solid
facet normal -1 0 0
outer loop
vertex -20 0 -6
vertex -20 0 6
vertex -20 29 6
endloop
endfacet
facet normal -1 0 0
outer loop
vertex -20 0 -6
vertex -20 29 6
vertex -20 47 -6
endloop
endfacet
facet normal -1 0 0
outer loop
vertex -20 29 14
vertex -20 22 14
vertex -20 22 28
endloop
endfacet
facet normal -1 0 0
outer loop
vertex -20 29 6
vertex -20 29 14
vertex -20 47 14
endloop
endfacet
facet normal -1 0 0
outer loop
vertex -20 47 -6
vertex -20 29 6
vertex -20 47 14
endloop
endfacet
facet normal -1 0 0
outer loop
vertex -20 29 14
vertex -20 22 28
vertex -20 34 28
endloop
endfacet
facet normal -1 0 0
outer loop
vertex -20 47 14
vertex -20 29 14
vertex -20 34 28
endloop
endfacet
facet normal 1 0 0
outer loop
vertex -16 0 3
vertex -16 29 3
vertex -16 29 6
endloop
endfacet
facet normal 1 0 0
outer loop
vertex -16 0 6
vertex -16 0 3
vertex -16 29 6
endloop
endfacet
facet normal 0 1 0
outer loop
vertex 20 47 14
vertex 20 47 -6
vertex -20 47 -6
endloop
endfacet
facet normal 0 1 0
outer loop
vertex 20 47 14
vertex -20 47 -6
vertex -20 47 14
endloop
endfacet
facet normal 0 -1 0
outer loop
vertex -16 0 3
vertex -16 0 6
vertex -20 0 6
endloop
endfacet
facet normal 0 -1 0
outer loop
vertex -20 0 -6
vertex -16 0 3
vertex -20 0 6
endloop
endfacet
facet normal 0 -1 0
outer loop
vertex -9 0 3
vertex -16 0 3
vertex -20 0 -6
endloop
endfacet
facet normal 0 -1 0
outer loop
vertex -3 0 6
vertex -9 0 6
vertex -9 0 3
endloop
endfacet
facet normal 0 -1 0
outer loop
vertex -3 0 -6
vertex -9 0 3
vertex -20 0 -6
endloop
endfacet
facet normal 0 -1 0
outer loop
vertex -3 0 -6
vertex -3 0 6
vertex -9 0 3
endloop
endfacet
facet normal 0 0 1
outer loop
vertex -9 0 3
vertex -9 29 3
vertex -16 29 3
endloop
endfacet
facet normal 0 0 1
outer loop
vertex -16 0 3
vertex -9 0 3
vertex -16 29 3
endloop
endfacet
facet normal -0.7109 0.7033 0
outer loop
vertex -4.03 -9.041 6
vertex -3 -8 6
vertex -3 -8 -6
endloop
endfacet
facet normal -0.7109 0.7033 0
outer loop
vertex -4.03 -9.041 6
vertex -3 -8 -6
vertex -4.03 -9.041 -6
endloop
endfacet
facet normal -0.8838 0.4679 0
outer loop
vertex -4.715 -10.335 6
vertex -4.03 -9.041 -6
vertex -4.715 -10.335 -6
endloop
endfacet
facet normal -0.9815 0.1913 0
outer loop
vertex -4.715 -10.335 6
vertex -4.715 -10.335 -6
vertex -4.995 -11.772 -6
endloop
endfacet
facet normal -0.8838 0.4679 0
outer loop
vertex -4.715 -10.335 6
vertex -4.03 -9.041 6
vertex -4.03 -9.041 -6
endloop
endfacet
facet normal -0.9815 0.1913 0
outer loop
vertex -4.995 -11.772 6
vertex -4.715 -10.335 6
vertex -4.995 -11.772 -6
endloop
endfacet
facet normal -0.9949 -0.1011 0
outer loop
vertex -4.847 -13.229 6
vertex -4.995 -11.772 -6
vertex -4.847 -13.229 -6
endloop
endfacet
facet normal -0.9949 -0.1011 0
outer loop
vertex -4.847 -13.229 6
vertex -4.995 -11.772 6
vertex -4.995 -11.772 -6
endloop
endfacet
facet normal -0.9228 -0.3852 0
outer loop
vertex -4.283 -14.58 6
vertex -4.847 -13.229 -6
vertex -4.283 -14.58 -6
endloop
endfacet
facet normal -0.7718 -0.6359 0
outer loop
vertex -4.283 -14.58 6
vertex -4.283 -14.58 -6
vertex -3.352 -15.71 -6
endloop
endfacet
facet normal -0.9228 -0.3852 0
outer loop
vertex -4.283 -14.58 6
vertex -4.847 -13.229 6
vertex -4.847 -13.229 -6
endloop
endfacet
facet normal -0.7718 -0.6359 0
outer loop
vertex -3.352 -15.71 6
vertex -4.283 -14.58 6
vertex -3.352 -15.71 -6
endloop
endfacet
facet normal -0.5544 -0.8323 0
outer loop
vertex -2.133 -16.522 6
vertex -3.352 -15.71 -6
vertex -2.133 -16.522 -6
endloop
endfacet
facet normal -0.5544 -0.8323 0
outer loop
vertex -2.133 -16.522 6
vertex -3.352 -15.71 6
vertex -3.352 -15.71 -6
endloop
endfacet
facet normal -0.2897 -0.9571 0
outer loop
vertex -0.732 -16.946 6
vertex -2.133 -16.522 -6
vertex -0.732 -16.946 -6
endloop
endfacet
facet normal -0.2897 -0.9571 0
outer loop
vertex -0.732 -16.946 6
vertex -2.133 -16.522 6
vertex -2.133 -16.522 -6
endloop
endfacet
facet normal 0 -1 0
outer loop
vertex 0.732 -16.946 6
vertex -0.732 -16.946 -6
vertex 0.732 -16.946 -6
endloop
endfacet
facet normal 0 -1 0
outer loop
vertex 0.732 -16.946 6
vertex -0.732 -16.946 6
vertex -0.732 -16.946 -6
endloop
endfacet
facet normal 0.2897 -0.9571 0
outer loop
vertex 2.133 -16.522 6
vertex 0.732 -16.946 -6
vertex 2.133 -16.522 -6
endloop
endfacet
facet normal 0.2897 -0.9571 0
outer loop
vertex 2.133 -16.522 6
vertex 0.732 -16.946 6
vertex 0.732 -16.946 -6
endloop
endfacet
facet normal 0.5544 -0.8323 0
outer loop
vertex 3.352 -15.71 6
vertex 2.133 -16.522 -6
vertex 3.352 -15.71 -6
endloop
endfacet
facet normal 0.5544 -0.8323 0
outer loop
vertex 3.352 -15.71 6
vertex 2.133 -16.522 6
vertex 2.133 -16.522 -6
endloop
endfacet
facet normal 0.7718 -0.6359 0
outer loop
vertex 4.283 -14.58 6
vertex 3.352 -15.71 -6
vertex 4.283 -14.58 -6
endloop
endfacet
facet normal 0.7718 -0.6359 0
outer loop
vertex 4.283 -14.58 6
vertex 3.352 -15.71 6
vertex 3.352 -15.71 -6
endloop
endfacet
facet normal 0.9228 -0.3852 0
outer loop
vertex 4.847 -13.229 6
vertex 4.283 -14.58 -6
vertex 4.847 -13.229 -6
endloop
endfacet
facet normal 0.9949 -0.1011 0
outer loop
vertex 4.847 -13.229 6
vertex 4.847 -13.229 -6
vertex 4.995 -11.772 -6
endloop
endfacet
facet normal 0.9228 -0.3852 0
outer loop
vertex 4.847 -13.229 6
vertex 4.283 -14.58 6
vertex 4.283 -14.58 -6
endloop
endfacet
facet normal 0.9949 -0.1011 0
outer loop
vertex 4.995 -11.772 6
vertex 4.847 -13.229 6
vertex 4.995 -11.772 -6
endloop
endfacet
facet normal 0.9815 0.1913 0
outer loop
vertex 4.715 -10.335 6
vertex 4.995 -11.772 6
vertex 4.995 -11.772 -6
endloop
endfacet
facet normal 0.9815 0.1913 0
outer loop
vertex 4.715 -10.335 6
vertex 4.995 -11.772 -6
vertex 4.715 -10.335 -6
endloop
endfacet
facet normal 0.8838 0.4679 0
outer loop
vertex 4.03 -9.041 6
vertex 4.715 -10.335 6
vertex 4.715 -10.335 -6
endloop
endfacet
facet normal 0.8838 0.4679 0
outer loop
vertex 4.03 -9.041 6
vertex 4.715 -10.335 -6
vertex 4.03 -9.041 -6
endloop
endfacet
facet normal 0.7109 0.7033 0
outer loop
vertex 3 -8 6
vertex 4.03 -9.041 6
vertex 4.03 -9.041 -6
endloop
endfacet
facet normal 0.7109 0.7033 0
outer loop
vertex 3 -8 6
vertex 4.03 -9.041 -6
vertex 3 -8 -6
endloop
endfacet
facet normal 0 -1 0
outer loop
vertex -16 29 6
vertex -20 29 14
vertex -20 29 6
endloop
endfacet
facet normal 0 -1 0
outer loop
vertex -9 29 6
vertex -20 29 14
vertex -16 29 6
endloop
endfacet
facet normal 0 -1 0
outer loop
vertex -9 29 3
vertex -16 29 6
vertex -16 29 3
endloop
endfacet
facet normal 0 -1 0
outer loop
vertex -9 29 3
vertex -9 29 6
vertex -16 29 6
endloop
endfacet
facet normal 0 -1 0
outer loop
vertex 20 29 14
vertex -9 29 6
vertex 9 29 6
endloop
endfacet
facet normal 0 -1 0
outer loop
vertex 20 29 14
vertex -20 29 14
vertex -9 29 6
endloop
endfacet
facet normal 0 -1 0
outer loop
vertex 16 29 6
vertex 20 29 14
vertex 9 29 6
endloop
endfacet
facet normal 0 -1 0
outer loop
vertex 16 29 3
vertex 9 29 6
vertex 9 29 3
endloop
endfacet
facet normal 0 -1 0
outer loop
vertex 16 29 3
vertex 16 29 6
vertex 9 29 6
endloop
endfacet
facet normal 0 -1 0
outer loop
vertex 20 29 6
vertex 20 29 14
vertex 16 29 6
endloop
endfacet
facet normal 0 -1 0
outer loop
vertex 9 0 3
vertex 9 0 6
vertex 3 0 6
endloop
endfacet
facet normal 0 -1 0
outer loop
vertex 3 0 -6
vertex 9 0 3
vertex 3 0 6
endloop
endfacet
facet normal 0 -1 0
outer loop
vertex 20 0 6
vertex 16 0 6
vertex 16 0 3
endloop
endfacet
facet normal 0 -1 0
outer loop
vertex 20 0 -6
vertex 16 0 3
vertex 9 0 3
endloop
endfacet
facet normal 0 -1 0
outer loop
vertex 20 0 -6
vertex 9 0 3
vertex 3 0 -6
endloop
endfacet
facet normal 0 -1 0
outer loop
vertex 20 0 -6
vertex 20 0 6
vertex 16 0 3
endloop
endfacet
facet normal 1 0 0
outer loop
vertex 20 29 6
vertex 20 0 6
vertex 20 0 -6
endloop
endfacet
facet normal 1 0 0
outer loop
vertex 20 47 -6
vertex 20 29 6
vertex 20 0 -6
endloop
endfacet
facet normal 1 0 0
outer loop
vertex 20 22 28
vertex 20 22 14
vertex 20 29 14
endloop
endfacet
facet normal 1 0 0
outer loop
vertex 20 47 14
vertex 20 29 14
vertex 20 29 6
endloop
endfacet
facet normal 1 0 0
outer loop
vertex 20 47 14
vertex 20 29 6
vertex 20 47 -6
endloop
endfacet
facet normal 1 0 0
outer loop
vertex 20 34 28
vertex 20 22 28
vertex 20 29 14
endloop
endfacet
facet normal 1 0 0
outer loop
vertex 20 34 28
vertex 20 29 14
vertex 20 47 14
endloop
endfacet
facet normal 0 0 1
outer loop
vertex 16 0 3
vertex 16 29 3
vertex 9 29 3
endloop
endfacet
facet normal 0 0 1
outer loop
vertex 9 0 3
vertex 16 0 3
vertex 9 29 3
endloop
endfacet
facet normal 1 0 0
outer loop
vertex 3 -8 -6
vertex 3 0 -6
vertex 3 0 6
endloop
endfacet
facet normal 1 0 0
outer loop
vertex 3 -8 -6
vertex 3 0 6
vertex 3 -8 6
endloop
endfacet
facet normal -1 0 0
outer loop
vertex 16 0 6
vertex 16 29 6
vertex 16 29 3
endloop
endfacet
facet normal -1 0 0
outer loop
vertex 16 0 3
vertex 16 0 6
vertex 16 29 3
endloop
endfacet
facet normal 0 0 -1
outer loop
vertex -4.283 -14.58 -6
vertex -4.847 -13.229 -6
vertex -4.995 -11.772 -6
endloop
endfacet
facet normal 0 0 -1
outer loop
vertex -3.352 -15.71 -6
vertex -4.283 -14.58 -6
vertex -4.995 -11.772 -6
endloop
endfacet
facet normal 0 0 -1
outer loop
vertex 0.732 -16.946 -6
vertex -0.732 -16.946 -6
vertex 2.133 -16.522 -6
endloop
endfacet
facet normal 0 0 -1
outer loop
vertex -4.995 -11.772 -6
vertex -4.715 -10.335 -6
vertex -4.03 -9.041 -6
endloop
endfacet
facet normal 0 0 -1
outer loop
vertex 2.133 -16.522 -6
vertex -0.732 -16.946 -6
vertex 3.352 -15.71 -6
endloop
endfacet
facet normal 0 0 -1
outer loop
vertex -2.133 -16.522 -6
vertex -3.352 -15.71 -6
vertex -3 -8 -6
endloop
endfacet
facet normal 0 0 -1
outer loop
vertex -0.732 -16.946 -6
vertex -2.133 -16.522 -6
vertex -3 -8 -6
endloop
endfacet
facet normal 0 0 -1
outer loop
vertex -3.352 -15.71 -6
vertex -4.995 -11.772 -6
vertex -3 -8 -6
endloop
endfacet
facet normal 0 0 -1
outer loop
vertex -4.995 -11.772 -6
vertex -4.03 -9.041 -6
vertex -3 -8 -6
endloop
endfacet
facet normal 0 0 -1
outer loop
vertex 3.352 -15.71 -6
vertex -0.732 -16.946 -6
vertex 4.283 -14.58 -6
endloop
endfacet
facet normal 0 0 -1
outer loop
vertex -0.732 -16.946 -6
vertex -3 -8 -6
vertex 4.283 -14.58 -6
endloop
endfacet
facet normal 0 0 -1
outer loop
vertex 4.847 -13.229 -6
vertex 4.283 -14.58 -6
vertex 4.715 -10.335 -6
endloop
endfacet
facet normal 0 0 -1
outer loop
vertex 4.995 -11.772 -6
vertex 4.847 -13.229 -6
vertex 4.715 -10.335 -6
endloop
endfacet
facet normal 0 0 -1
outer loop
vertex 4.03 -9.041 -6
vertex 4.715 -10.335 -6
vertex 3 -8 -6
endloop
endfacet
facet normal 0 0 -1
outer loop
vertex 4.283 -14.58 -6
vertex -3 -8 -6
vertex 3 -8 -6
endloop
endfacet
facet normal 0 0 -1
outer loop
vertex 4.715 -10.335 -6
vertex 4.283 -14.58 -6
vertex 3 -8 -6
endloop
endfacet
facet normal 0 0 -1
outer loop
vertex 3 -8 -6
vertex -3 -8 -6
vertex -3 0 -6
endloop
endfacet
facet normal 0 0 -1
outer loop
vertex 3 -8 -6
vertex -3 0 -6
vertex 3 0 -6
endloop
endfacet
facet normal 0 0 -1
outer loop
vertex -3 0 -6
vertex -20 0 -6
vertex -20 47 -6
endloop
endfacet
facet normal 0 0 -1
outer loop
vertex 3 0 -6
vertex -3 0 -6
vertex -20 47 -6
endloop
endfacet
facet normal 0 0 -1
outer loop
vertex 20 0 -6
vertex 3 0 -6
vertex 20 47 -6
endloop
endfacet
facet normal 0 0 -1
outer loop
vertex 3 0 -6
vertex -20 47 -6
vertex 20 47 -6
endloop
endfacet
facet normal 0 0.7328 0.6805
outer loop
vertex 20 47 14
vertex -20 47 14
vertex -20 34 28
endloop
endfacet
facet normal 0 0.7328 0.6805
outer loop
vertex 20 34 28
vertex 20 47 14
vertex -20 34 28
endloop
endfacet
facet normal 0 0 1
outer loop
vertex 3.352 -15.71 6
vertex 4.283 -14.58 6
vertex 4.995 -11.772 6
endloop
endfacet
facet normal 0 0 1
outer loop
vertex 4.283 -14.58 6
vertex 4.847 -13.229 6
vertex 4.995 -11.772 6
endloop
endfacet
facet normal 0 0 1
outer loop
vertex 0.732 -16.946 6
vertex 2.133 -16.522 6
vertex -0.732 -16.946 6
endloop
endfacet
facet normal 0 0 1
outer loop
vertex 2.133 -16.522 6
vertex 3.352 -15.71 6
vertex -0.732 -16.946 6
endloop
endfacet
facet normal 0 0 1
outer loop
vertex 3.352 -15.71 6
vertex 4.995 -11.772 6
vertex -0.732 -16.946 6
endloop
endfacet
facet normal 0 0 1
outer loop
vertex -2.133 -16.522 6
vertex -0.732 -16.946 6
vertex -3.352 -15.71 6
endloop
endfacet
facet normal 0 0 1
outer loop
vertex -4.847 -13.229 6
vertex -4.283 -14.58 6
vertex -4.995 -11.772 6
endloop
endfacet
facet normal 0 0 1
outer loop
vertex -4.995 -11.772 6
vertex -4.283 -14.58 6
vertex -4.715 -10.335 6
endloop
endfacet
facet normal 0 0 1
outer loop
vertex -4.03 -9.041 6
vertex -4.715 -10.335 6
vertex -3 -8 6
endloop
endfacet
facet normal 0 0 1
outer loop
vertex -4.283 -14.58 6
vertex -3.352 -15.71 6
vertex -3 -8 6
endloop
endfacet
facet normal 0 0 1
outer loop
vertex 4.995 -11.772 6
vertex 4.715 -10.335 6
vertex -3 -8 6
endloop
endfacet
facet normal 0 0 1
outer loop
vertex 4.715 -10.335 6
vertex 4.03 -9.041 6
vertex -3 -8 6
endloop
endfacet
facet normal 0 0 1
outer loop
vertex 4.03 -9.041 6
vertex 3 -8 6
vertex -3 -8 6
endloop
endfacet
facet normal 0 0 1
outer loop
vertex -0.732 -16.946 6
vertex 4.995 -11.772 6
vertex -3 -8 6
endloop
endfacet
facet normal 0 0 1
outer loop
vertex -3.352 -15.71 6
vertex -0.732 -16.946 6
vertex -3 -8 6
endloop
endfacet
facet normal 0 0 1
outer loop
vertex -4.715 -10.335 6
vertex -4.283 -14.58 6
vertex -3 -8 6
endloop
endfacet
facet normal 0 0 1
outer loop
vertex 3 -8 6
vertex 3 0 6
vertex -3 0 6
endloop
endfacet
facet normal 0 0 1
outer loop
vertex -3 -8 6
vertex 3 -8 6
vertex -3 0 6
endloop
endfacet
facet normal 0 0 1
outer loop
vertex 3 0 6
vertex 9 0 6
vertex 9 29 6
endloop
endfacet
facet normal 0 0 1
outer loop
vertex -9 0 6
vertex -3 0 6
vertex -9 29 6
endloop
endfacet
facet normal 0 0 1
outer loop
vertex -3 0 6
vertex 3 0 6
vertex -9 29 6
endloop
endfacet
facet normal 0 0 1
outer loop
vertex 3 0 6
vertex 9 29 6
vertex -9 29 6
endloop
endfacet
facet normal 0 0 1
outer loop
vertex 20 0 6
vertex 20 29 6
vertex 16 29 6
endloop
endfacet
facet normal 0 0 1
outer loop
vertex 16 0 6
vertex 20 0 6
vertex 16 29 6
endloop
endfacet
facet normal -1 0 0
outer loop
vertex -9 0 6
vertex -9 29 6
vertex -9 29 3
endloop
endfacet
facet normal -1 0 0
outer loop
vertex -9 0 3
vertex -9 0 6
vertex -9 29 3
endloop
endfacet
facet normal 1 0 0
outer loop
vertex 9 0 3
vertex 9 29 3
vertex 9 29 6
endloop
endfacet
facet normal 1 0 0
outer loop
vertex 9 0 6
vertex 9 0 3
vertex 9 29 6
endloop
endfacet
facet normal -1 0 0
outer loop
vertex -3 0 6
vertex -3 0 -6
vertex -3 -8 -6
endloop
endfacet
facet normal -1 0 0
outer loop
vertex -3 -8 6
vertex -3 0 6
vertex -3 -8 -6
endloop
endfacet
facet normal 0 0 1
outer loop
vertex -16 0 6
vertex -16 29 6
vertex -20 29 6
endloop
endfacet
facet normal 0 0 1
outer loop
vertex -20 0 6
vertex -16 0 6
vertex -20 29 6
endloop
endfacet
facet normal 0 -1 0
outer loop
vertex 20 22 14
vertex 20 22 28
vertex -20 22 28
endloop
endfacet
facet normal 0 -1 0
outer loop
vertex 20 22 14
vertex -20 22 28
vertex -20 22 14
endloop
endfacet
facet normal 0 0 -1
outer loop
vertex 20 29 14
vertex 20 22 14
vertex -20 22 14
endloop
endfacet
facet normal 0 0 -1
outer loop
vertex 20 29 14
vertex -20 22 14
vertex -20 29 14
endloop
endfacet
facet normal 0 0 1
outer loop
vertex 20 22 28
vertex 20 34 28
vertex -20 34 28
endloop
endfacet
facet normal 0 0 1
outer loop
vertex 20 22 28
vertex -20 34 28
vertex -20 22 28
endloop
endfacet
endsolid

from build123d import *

# Parameters (mm, degrees)
PAD_DEPTH    = 20
PAD001_DEPTH = 6


with BuildPart() as part:
    # AdditivePipe: sweep along a path in Sketch
    with BuildLine(Plane.XY) as additivepipe_path:
        Line((0, 0), (0, 47))
    # Sketch001 → AdditivePipe (sweep)
    with BuildSketch(Plane.XZ):
        Polygon((-20, 6), (-20, -6), (-16, -6), (-9, -6), (9, -6), (16, -6), (20, -6), (20, 6), (16, 6), (16, 3), (9, 3), (9, 6), (-9, 6), (-9, 3), (-16, 3), (-16, 6), align=None)
    sweep(path=additivepipe_path.line)

    # Sketch002 → Pad (new body, symmetric)
    with BuildSketch(Plane.YZ):
        Polygon((47, 3), (47, 14), (34, 28), (22, 28), (22, 14), (29, 14), (29, 3), align=None)
    extrude(amount=PAD_DEPTH, both=True)

    # Sketch003 → Pad001 (join, symmetric)
    with BuildSketch(Plane.XY):
        with BuildLine():
            Line((-3, 0), (3, 0))
            Line((3, 0), (3, -8))
            ThreePointArc((-3, -8), (0, -17), (3, -8))
            Line((-3, 0), (-3, -8))
        make_face()
    extrude(amount=PAD001_DEPTH, both=True)


solid = part.part
